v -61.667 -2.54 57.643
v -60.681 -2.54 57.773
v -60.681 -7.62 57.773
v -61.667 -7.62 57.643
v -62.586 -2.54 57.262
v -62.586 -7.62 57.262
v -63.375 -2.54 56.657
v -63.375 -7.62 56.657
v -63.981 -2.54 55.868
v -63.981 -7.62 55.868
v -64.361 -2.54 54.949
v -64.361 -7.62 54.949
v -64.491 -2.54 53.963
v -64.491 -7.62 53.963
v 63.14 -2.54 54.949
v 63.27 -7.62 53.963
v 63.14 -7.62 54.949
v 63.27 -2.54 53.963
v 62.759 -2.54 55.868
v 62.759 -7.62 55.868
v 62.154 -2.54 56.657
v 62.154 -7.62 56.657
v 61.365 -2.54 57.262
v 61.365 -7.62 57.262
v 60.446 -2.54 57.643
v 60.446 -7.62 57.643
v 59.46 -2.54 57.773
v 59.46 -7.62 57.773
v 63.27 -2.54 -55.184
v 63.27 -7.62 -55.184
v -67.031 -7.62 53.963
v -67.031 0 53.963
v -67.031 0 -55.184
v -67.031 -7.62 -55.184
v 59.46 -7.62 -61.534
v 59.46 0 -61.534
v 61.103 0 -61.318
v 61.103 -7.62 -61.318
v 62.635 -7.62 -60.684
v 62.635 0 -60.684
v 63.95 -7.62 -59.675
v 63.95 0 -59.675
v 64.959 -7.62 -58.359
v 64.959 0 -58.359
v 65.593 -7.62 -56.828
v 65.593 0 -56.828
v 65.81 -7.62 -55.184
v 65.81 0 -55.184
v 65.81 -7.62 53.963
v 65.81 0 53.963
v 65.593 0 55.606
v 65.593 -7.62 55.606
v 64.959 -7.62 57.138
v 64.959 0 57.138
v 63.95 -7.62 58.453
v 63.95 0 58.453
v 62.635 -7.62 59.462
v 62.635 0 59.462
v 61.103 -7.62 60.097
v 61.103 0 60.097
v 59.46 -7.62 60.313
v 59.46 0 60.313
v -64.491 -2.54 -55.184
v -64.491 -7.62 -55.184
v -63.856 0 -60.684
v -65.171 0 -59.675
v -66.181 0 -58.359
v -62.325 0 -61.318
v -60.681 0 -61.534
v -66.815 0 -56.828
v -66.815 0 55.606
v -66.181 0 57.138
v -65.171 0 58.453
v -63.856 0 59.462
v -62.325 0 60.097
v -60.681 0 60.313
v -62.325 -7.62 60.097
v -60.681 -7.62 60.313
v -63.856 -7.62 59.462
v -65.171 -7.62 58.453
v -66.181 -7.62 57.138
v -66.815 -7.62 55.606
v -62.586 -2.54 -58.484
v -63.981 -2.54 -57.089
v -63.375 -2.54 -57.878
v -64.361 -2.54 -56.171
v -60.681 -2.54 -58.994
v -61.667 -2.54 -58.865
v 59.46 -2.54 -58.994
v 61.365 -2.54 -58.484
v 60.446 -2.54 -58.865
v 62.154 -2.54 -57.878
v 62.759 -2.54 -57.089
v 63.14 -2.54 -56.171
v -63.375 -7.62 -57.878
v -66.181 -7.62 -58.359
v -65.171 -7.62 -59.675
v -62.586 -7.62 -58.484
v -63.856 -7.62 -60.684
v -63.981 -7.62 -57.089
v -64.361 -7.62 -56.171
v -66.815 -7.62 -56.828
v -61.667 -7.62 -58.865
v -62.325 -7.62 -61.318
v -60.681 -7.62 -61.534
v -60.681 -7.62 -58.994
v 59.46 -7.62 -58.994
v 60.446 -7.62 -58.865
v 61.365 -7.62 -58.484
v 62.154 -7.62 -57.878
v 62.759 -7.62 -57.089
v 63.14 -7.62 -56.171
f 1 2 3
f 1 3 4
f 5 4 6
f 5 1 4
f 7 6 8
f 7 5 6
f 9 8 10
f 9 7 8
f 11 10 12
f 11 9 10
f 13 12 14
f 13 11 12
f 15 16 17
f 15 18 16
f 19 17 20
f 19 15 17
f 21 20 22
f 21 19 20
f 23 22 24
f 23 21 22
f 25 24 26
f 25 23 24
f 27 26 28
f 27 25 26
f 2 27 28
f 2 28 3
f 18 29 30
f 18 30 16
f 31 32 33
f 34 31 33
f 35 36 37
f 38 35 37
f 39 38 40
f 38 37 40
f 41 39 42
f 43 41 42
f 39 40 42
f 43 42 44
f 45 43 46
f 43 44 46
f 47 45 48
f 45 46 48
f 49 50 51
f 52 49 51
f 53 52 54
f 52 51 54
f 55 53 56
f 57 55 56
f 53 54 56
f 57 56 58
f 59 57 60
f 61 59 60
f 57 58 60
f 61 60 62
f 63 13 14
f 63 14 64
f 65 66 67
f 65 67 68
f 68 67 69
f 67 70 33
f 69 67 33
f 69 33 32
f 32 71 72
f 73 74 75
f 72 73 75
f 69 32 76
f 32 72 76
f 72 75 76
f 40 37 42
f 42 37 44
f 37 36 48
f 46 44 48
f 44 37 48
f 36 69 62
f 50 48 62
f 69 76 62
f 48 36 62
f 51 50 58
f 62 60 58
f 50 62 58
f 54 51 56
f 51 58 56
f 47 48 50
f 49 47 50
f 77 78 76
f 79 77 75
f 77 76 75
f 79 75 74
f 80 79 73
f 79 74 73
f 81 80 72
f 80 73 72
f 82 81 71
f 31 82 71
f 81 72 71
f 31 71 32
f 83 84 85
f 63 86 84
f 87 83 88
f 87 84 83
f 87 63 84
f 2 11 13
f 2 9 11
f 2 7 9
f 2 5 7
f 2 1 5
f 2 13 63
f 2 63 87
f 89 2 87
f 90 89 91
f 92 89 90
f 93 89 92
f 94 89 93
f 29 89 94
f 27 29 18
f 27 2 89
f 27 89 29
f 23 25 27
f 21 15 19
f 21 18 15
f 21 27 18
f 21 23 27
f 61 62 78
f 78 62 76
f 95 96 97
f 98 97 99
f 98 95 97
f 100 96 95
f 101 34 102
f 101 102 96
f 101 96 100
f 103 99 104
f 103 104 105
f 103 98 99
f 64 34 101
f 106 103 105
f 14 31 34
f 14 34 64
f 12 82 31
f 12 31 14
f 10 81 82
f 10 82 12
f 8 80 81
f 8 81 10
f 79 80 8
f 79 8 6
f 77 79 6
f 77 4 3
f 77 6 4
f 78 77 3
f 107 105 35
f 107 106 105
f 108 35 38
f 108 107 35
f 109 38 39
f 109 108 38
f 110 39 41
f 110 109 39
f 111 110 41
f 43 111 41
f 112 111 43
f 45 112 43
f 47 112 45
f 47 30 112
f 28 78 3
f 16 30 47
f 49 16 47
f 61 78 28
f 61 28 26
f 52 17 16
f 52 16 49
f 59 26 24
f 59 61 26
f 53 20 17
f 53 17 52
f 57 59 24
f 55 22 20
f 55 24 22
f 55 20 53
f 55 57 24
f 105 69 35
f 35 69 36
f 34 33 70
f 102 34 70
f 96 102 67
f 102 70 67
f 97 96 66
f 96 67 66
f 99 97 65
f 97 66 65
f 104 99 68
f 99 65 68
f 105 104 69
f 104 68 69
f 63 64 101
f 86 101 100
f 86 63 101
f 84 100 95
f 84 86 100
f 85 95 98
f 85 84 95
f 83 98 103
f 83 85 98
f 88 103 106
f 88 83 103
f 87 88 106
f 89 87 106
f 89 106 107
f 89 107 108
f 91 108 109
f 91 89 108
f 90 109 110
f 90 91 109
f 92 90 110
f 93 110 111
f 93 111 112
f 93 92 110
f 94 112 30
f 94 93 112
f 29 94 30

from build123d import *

# Parameters (mm, degrees)
F1_DEPTH = 7.62
F2_T     = -2.54


with BuildPart() as f1:
    # F0 (on Front) → F1 (new body)
    with BuildSketch(Plane.XZ):
        with BuildLine():
            Line((59.459757, 60.312882), (-60.681279, 60.312882))
            ThreePointArc((-60.681279, 60.312882), (-65.171407, 58.45301), (-67.031279, 53.962882))
            Line((-67.031279, 53.962882), (-67.031279, -55.184408))
            ThreePointArc((-67.031279, -55.184408), (-65.171407, -59.674537), (-60.681279, -61.534408))
            Line((-60.681279, -61.534408), (59.459757, -61.534408))
            ThreePointArc((59.459757, -61.534408), (63.949885, -59.674537), (65.809757, -55.184408))
            Line((65.809757, -55.184408), (65.809757, 53.962882))
            ThreePointArc((65.809757, 53.962882), (63.949885, 58.45301), (59.459757, 60.312882))
        make_face()
    extrude(amount=F1_DEPTH)

    # F2
    f2_openings = [f1.faces().sort_by_distance(p)[0] for p in [
        (-0.610761, -7.62, -0.610763),
    ]]
    offset(amount=F2_T, openings=f2_openings)


solid = f1.part
